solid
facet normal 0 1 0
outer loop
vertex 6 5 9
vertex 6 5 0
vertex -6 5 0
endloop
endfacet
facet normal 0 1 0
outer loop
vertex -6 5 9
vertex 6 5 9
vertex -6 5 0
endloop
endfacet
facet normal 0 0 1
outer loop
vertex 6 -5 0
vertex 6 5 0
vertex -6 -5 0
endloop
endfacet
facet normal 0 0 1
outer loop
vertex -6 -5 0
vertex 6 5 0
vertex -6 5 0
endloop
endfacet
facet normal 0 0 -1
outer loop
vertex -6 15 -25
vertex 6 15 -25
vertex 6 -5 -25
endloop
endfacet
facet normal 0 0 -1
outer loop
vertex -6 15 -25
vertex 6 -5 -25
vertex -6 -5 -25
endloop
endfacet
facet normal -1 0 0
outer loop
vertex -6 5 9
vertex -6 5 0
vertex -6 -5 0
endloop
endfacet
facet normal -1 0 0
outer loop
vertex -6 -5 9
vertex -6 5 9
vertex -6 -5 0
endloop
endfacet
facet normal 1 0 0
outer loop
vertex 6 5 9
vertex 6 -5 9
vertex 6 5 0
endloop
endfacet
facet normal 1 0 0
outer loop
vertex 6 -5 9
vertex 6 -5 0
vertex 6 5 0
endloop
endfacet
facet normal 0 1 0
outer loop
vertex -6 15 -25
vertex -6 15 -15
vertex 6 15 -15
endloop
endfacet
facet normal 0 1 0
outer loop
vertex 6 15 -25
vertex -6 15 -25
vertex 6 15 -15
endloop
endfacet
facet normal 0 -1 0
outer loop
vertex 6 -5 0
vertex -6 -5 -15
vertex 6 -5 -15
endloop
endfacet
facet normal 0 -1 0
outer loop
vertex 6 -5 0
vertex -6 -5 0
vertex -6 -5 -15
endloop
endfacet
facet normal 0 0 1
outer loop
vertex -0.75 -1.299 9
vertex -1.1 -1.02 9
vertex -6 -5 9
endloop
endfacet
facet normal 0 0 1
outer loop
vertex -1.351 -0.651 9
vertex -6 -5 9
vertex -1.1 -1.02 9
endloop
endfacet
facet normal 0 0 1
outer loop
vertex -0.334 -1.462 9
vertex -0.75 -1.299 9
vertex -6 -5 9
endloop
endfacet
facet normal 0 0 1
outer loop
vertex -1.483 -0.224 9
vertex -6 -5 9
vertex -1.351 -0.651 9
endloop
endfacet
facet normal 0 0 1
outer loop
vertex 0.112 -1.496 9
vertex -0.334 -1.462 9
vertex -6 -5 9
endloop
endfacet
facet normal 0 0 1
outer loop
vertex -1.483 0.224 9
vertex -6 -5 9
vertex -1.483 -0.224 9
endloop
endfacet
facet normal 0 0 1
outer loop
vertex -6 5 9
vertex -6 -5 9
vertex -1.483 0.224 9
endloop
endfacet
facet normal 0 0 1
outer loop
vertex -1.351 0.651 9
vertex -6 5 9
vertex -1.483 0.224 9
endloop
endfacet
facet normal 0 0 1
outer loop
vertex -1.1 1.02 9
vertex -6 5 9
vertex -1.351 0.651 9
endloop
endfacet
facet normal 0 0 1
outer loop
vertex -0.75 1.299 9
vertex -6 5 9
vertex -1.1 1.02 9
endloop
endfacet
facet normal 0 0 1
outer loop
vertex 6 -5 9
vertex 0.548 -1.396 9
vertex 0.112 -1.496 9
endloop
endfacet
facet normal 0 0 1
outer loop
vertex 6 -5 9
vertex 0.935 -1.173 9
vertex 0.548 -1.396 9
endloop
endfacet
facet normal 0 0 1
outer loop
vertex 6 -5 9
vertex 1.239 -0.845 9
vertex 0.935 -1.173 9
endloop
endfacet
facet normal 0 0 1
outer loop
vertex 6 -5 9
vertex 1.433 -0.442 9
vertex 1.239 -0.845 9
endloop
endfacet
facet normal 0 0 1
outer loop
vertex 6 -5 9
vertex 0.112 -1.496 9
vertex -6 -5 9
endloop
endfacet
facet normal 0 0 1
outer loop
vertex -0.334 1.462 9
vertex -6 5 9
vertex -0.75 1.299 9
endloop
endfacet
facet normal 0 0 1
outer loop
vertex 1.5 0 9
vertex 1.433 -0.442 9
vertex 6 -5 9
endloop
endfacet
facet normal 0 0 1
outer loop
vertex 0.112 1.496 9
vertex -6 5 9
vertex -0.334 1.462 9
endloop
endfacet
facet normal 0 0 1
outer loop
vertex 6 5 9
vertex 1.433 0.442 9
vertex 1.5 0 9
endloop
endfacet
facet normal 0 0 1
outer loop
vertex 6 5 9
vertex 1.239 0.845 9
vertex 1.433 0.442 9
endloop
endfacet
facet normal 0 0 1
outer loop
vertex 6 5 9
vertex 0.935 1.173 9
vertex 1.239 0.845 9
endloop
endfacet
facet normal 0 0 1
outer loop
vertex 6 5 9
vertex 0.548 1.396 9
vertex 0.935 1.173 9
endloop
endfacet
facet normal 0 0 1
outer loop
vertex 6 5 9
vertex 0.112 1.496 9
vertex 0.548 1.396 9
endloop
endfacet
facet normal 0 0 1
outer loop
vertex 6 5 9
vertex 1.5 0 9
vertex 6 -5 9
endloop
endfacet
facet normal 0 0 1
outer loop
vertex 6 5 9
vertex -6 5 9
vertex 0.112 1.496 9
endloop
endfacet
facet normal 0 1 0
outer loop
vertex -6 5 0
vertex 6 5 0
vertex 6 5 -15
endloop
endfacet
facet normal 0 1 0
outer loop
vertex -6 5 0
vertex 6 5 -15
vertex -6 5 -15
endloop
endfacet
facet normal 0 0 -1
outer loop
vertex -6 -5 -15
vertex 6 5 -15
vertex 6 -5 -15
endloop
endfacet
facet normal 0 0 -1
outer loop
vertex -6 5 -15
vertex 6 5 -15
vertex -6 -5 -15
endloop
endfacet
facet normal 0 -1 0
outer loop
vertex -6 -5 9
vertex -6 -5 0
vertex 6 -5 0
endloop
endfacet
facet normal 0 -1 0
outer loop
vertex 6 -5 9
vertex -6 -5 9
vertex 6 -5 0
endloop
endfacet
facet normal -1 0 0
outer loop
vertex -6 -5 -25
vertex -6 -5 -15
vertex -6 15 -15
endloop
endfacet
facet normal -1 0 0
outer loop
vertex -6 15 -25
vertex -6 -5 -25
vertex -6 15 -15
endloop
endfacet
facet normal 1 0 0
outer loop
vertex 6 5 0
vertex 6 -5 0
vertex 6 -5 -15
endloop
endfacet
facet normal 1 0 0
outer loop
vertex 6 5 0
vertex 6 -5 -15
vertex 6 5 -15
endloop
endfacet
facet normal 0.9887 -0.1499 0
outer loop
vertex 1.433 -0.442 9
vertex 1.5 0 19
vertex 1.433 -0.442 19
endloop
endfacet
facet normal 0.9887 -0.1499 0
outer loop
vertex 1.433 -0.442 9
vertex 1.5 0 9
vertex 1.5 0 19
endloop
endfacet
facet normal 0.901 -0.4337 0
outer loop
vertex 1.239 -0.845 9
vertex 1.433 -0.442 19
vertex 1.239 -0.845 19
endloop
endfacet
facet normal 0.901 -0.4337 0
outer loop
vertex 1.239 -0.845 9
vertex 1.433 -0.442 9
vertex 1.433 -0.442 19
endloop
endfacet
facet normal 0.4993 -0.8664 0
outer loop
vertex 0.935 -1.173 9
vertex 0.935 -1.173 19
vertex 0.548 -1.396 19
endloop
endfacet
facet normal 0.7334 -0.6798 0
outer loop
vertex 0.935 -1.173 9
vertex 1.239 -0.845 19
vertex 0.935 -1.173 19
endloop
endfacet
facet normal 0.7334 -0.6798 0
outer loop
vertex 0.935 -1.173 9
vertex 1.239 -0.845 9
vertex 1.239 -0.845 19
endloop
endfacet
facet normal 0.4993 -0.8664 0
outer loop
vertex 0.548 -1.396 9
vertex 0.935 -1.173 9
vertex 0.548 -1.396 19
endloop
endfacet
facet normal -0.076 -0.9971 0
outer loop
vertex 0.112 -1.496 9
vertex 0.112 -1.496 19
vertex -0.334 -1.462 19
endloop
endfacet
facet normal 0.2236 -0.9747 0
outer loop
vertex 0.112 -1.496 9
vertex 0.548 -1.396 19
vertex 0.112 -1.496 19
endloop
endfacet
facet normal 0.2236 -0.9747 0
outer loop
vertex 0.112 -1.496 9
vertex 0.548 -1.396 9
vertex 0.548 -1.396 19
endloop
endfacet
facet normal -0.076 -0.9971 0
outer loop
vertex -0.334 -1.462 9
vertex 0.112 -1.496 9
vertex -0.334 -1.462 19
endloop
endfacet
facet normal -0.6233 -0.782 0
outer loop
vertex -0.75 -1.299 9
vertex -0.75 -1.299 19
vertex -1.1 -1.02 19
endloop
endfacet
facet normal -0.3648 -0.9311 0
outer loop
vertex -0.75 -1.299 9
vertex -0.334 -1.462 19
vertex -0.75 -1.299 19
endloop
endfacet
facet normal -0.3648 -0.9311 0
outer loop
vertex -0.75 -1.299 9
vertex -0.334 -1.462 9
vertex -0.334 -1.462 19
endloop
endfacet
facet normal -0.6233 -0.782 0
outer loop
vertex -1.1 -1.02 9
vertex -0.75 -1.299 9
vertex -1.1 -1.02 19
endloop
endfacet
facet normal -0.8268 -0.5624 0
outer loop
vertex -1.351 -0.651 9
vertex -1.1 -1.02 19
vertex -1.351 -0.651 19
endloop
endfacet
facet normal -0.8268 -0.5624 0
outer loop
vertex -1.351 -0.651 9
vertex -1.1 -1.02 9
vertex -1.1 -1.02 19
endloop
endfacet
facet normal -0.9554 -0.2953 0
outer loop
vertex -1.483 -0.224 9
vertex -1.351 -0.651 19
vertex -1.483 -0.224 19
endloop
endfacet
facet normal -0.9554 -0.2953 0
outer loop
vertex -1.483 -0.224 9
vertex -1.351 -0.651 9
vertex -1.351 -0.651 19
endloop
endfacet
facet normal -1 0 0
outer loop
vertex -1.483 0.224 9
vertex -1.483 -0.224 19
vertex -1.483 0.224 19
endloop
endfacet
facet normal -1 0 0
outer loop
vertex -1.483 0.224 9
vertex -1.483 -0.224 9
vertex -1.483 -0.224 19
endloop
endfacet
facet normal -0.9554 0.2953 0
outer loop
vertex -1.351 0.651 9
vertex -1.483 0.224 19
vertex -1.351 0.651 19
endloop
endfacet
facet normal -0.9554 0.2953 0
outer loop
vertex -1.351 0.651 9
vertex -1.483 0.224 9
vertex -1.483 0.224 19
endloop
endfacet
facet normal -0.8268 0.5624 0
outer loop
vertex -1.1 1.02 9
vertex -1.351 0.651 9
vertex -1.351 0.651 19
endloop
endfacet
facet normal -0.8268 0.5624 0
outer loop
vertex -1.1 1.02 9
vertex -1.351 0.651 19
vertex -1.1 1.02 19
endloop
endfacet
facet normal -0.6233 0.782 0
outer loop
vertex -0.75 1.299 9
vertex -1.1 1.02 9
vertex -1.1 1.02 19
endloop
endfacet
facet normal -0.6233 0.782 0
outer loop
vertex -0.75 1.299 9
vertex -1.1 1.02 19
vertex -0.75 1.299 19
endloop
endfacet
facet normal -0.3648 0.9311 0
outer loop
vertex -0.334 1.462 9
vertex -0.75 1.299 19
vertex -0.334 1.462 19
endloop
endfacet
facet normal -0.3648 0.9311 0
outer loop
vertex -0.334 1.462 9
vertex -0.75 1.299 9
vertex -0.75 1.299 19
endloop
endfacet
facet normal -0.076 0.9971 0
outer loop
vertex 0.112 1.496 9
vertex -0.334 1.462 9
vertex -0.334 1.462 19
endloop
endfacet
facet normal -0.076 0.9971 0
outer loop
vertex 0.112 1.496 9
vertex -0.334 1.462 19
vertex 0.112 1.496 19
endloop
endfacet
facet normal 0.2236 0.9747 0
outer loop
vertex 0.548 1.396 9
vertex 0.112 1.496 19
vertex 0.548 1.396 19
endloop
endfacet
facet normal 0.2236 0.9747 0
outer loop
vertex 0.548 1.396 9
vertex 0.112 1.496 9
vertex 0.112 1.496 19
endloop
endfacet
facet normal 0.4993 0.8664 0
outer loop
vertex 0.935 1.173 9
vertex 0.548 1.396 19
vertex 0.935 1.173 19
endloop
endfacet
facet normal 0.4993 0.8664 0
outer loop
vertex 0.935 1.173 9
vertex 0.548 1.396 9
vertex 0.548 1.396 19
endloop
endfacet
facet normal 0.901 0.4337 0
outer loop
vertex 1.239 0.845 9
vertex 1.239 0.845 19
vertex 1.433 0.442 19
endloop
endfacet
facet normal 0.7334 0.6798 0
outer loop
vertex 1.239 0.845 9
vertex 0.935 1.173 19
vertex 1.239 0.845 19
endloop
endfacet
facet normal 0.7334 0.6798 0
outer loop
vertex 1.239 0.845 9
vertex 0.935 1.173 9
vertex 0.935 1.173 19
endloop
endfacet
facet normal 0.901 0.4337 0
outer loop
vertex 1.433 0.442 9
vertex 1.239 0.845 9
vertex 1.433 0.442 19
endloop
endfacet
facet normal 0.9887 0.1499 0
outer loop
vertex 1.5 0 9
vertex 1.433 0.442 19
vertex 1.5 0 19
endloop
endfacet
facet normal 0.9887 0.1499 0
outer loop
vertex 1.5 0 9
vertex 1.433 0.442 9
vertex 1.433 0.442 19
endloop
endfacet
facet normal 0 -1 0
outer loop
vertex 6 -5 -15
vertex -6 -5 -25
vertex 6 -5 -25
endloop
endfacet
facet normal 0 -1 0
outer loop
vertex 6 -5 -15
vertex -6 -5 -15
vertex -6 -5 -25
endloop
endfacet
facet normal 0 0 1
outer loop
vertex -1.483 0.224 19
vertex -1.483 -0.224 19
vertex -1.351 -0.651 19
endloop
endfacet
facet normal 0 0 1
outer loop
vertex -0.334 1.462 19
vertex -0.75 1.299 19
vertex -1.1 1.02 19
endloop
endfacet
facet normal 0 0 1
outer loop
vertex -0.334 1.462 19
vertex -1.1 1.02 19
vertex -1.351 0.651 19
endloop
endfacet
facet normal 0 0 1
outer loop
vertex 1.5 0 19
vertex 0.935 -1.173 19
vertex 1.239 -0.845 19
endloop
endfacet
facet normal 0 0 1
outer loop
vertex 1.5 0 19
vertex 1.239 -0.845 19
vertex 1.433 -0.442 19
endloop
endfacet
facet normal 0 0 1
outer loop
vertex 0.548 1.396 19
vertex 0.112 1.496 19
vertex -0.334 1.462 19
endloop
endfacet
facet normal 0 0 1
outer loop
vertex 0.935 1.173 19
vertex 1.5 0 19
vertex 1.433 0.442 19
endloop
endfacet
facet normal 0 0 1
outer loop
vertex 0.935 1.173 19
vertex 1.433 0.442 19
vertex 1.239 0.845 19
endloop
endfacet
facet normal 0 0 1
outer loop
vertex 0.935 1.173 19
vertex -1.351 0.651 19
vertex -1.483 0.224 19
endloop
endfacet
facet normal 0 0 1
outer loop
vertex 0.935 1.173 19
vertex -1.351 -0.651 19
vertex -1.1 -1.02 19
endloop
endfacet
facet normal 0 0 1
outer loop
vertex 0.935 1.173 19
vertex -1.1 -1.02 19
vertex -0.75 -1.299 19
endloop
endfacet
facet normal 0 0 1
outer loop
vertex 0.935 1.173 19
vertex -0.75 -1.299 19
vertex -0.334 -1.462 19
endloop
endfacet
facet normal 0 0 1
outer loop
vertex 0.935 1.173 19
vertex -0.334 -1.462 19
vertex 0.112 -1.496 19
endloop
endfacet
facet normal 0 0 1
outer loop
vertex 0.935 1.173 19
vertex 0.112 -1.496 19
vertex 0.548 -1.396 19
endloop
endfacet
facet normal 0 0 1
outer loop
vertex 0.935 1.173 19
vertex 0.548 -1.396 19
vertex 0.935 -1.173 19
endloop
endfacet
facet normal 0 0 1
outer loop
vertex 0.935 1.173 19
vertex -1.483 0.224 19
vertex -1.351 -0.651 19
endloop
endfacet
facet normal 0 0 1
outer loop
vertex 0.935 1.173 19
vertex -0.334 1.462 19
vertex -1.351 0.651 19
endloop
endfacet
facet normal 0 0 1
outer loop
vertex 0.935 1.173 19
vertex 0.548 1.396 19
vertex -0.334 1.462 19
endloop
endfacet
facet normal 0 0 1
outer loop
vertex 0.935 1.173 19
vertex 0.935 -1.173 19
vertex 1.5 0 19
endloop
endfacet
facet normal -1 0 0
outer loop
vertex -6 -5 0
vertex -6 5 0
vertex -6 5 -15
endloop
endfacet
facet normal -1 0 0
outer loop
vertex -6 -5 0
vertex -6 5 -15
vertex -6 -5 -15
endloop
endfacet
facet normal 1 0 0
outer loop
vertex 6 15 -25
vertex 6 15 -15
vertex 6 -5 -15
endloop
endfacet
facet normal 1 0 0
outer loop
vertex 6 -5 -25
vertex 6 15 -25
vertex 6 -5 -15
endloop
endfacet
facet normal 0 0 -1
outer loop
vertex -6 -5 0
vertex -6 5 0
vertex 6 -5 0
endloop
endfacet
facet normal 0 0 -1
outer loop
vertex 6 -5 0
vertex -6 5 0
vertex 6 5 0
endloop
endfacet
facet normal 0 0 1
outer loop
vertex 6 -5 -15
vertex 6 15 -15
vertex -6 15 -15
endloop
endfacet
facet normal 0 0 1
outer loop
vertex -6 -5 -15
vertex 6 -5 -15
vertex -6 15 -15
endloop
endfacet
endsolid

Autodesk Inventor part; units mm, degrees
ref_plane "YZ Plane" through (0, 0, 0) normal (1, 0, 0) x (0, 1, 0)
ref_plane "XZ Plane" through (0, 0, 0) normal (0, 1, 0) x (-1, 0, 0)
ref_plane "XY Plane" through (0, 0, 0) normal (0, 0, 1) x (1, 0, 0)
sketch "Sketch1" plane through (0, 0, 0) normal (0, 0, 1) x (1, 0, 0)
  line L0 (-6, -5) -> (6, -5)
  line L1 (6, -5) -> (6, 5)
  line L2 (6, 5) -> (-6, 5)
  line L3 (-6, 5) -> (-6, -5)
  line L4 (-6, -5) -> (6, 5) construction
  line L5 (6, -5) -> (-6, 5) construction
  point P0 (0, 0)
  dimension "d0" = 12
  dimension "d1" = 10
extrude "Extrusion1" add sketch "Sketch1" along normal blind 9
sketch "Sketch2" plane through (0, 0, 0) normal (0, 0, -1) x (-1, 0, 0)
  line L0 (-6, 5) -> (6, 5) projected
  line L1 (-6, -5) -> (-6, 5) projected
  line L2 (6, -5) -> (-6, -5) projected
  line L3 (6, 5) -> (6, -5) projected
  point P0 (0, 0)
extrude "Extrusion2" add sketch "Sketch2" along normal blind 15 separate body
sketch "Sketch3" plane through (0, 0, -15) normal (0, 0, -1) x (-1, 0, 0)
  line L0 (6, -5) -> (-6, -5) projected
  line L1 (-6, -5) -> (6, -5)
  line L2 (6, -5) -> (6, 15)
  line L3 (6, 15) -> (-6, 15)
  line L4 (-6, 15) -> (-6, -5)
  line L5 (6, -5) -> (6, 5) projected
  line L6 (6, 5) -> (-6, 5) projected
  point P0 (0, 0)
  dimension "d6" = 10
extrude "Extrusion3" add sketch "Sketch3" along normal blind 10 separate body
sketch "Sketch4" plane through (0, 0, 9) normal (0, 0, 1) x (1, 0, 0)
  circle A0 centre (0, 0) radius 1.5
  dimension "d9" = 3
extrude "Extrusion4" add sketch "Sketch4" along normal blind 10 bodies 1
properties part number "motor2"
